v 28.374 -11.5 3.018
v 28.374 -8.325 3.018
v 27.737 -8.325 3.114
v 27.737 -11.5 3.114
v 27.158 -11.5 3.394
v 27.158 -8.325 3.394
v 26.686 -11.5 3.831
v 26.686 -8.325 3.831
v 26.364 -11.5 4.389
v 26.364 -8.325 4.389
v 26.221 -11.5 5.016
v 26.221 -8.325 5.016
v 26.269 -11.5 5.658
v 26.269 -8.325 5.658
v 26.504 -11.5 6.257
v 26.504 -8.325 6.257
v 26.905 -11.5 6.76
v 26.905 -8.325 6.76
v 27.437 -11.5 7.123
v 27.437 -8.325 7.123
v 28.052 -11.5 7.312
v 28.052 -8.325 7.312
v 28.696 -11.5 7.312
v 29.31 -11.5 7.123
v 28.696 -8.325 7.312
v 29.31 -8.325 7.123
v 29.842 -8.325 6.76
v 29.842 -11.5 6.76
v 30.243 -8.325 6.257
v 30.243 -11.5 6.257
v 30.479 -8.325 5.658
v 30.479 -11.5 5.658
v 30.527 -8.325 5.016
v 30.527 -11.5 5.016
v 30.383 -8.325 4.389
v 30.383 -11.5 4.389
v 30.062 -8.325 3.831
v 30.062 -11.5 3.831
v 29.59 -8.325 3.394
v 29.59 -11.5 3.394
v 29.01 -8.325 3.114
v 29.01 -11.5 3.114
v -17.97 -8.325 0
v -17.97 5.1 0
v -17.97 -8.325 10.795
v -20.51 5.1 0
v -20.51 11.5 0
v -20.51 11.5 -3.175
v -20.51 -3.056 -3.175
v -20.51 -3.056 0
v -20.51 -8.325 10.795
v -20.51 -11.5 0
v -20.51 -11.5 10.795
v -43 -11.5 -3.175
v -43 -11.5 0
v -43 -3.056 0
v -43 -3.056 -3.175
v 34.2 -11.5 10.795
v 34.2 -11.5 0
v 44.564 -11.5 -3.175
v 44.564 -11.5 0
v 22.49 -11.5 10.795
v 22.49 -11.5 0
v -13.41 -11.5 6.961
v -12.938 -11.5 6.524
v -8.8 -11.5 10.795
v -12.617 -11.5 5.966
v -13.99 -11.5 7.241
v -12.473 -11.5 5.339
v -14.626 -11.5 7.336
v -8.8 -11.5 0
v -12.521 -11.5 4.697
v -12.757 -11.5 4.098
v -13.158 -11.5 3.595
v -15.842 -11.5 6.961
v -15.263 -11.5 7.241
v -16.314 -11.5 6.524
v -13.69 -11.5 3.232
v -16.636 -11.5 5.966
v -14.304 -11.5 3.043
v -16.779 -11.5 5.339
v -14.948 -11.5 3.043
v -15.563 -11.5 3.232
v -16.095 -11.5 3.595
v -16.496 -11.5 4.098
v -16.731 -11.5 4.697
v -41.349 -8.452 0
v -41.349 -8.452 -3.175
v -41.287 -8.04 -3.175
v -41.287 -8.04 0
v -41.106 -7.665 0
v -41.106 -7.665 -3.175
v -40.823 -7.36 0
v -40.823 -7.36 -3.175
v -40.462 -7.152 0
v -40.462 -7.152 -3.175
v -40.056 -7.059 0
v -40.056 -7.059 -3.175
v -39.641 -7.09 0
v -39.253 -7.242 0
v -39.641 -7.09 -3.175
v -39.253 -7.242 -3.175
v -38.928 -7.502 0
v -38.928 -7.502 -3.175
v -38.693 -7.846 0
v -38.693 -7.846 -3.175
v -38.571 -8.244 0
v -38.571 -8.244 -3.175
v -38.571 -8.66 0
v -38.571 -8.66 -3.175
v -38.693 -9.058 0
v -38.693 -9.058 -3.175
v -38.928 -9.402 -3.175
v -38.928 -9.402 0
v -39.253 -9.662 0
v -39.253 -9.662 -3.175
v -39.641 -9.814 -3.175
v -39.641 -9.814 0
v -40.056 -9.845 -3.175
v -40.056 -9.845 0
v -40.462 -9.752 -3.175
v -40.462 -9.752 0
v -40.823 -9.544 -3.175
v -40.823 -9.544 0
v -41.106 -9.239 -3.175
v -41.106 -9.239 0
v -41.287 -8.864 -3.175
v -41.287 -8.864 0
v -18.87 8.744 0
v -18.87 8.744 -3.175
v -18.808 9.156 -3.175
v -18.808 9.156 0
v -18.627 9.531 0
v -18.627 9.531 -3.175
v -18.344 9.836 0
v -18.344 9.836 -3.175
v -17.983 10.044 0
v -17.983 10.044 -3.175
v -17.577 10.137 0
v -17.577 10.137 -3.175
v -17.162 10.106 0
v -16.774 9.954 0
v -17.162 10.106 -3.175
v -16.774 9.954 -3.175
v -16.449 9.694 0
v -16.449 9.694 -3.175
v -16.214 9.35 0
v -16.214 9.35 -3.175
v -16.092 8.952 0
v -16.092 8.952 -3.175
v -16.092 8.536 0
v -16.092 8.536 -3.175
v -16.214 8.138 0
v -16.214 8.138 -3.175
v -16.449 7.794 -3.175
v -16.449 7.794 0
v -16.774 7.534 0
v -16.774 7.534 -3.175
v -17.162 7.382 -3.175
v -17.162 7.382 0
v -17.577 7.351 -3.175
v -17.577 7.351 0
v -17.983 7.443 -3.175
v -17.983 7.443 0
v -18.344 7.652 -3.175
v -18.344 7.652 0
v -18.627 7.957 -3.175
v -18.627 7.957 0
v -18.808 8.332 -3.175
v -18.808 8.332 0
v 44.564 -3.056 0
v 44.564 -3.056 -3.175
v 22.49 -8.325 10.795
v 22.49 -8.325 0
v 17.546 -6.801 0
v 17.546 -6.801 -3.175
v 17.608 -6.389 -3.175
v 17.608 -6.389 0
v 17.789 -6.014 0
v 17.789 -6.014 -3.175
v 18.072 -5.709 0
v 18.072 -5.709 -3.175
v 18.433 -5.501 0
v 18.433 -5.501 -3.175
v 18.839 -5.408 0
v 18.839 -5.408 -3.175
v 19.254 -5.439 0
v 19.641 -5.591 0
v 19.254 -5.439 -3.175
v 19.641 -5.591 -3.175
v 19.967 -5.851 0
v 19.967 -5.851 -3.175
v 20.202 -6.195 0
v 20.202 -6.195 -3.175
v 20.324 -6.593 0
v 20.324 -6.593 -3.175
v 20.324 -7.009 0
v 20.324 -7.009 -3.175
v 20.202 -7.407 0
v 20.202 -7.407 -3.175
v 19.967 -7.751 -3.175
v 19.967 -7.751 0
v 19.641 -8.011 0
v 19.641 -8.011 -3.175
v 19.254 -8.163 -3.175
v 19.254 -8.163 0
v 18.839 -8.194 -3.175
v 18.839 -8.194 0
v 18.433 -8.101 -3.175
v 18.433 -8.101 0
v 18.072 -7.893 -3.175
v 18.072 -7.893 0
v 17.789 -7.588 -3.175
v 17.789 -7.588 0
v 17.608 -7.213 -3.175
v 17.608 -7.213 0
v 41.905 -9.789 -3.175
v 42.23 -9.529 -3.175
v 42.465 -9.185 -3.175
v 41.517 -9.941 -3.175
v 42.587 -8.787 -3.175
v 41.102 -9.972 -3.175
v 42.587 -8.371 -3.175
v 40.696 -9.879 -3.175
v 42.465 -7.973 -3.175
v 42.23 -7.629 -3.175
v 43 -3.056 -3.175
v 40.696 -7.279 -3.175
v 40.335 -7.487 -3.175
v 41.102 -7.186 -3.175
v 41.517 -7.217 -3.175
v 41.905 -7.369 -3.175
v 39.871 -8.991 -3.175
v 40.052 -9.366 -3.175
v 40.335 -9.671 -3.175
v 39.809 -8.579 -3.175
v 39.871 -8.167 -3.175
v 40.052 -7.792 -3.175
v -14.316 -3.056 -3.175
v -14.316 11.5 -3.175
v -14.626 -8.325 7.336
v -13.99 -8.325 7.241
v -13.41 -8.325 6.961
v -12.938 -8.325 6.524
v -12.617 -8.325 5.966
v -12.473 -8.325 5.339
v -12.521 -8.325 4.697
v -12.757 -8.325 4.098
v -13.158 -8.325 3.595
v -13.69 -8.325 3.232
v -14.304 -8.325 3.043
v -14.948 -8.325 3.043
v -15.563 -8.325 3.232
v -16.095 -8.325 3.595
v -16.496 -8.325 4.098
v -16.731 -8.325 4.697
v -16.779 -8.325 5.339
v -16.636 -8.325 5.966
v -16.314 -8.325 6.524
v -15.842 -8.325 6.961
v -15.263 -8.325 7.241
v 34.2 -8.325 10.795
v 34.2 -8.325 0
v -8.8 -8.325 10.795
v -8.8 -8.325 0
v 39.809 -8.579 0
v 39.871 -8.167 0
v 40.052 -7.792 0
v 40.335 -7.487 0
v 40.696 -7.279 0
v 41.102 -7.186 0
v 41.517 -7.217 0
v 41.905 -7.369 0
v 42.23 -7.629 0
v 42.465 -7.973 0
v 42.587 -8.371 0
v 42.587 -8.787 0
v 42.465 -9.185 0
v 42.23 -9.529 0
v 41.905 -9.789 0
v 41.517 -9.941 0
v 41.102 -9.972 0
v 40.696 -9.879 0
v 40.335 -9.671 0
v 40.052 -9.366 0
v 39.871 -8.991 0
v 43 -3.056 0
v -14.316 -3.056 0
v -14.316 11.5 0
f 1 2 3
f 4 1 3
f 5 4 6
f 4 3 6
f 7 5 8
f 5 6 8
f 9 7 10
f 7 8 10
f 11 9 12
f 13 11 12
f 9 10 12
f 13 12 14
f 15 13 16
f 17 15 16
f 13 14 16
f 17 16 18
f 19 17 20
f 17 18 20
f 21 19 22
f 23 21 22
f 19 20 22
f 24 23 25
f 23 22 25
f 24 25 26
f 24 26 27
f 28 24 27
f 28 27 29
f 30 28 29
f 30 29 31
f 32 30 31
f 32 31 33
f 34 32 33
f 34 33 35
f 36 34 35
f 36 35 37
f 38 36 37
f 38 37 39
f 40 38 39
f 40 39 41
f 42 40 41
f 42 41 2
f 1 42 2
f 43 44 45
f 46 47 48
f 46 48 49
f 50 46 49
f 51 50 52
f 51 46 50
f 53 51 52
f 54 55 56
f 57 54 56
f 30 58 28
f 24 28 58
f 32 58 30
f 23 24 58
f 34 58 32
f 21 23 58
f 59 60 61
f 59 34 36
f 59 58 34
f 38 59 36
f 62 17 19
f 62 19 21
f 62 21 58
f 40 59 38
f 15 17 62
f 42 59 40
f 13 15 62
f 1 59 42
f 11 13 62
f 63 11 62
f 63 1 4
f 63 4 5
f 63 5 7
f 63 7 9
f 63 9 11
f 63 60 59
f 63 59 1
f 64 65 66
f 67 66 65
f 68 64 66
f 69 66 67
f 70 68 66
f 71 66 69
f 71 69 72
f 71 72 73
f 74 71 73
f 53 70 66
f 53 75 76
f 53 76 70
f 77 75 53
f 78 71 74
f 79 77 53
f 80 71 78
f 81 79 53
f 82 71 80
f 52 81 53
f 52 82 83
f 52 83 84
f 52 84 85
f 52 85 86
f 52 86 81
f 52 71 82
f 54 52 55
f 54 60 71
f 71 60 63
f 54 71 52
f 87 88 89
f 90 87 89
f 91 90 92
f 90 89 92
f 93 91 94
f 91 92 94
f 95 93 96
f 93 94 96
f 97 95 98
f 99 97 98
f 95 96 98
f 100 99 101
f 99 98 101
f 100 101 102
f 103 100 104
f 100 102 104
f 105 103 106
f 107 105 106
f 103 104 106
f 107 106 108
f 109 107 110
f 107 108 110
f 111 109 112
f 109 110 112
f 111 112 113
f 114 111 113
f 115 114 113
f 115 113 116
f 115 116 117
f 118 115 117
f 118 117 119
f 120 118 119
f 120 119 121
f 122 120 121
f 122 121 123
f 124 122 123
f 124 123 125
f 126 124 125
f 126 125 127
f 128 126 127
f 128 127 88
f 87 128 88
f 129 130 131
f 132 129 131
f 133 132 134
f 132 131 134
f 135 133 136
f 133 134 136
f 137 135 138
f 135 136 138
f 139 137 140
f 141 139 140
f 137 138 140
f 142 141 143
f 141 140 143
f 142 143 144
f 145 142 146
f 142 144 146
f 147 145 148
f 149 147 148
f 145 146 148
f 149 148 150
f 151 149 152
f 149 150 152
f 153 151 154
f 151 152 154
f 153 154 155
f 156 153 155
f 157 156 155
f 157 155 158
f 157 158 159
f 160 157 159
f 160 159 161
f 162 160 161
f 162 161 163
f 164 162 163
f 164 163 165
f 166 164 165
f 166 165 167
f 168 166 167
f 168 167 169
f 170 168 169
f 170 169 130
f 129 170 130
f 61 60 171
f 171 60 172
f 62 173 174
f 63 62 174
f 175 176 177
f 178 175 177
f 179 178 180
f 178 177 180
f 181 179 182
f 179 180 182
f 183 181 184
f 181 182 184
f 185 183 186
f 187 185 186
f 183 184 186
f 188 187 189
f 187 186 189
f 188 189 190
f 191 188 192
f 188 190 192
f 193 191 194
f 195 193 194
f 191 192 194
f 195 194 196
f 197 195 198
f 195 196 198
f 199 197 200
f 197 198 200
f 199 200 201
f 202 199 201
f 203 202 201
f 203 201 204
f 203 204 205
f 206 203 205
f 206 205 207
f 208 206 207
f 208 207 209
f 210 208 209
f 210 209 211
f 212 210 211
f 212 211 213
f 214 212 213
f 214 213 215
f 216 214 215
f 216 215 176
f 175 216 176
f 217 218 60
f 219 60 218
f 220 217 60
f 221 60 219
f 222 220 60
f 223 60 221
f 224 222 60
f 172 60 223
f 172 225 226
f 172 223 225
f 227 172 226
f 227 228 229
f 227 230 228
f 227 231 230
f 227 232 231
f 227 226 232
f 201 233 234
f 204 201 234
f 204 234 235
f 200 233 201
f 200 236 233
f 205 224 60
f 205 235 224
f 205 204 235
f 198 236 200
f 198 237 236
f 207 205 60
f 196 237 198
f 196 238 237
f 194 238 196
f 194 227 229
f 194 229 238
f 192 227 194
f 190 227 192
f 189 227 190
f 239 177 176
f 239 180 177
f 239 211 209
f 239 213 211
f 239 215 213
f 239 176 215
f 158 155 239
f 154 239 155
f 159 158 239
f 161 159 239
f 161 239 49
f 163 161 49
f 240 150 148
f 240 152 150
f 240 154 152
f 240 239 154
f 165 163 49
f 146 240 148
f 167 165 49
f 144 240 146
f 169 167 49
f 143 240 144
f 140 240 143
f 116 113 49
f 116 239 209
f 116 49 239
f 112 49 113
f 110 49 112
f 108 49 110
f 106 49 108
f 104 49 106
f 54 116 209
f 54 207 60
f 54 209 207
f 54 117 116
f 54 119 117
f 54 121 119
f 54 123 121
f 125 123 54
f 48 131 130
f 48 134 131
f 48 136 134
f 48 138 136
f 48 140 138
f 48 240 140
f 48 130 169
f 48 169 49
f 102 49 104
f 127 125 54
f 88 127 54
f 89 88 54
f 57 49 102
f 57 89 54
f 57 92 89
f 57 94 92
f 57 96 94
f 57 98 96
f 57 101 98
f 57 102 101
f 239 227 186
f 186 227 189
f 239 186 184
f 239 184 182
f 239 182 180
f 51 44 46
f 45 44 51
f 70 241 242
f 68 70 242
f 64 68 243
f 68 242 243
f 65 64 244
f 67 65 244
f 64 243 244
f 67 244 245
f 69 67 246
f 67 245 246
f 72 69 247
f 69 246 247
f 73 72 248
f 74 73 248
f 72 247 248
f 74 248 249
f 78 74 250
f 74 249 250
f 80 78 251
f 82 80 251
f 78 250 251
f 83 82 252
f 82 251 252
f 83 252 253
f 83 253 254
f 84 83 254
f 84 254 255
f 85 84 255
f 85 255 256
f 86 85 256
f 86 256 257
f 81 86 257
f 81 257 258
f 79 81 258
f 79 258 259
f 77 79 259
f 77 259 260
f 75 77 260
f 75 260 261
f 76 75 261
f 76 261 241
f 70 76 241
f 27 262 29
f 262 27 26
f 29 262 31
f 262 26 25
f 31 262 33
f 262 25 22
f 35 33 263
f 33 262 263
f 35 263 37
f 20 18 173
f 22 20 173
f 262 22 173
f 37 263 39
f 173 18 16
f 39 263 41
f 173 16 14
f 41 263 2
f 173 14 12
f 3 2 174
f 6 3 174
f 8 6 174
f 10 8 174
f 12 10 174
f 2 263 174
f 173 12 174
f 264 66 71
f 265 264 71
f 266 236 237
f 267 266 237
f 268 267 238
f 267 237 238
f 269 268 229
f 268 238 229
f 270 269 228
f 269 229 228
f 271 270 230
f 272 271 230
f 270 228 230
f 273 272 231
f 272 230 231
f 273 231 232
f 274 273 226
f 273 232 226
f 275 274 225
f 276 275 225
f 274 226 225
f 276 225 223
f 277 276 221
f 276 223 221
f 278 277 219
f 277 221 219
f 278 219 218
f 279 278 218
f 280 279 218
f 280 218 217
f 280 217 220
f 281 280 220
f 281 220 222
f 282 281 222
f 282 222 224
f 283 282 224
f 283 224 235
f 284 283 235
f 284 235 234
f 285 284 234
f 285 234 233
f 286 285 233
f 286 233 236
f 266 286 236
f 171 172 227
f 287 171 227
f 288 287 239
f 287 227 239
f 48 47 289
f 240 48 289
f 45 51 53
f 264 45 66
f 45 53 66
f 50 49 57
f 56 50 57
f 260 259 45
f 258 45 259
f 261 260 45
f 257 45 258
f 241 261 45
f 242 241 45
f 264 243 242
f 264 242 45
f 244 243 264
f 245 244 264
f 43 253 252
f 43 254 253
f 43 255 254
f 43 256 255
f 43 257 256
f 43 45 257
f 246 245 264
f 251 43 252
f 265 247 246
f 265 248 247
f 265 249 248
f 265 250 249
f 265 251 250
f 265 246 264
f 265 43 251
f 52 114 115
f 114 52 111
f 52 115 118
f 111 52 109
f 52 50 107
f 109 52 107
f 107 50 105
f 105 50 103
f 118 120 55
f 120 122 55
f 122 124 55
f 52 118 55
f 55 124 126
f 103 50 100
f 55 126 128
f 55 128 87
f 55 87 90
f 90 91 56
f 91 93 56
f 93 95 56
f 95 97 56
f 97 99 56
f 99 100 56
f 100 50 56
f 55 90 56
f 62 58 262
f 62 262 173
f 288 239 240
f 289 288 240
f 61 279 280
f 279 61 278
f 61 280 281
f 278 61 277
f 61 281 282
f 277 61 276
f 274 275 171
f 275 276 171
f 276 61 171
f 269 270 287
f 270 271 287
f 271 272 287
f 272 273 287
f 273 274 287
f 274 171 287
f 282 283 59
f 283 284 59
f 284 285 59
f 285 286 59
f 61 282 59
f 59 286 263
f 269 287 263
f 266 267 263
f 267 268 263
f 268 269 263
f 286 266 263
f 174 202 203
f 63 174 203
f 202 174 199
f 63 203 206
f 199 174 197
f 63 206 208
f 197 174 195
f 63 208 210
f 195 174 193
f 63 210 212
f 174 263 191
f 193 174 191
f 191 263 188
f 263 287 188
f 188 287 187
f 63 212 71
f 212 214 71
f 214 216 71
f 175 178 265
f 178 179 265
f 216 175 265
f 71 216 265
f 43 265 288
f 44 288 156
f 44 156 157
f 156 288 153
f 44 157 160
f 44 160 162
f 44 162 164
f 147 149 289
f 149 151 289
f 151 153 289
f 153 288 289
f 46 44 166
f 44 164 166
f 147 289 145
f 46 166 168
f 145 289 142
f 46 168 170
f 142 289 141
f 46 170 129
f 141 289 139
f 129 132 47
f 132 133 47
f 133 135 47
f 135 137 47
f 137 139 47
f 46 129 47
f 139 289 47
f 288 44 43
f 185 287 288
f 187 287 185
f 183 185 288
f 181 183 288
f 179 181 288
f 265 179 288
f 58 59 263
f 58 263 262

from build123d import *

# Parameters (mm, degrees)
SKETCH1_W           = 86
SKETCH1_H           = 23
BOSS_EXTRUDE1_DEPTH = 3.175
BOSS_EXTRUDE2_DEPTH = 3.175
SKETCH18_R          = 2.159
CUT_EXTRUDE2_DEPTH  = 127
SKETCH19_R          = 1.397
CUT_EXTRUDE3_DEPTH  = 47.652019249
SKETCH28_W          = 1.563549178
SKETCH28_H          = 8.443792612
BOSS_EXTRUDE4_DEPTH = 3.175
SKETCH27_W          = 57.315527743
SKETCH27_H          = 14.55620742
SKETCH27_W_2        = 22.489872753
CUT_EXTRUDE5_DEPTH  = 3.175
SKETCH29_W          = 13.689872798
SKETCH29_H          = 10.795
SKETCH29_W_2        = 13.689872764
CUT_EXTRUDE6_DEPTH  = 50.8
RIB3_REACH          = 68.958
SKETCH30_WALL_W     = 153.142504754
SKETCH30_WALL_H     = 2.54


with BuildPart() as part:
    # Sketch1 → Boss-Extrude1 (new body)
    with BuildSketch(Plane.XY):
        Rectangle(SKETCH1_W, SKETCH1_H)
    extrude(amount=-BOSS_EXTRUDE1_DEPTH)

    # Sketch3 → Boss-Extrude2 (add)
    with BuildSketch(Plane(origin=(0, -11.5, 0), x_dir=(-1, 0, 0), z_dir=(0, -1, 0))):
        Polygon((34.200000011, 0), (34.200000011, -10.795), (8.80000001, -10.795), (8.800000011, 0), align=None)
        Polygon((-34.200000011, 0), (-34.200000011, -10.795), (-8.80000001, -10.795), (-8.800000011, 0), align=None)
    extrude(amount=-BOSS_EXTRUDE2_DEPTH)

    # Sketch18 → Cut-Extrude2 (cut)
    with BuildSketch(Plane(origin=(0, 11.5, 0), x_dir=(1, 0, 0), z_dir=(0, 1, 0))):
        with Locations(Location((-14.626260209, -5.177433052, 0), (0, 0, 270))):
            Circle(SKETCH18_R)
        with Locations(Location((28.373739812, -5.177433052, 0), (0, 0, 90))):
            Circle(SKETCH18_R)
    extrude(amount=-CUT_EXTRUDE2_DEPTH, mode=Mode.SUBTRACT)

    # Sketch19 → Cut-Extrude3 (cut, through all)
    with BuildSketch(Plane(origin=(0, 0, -3.175), x_dir=(-1, 0, 0), z_dir=(0, 0, -1))):
        with Locations((-41.206, -8.579)):
            Circle(SKETCH19_R)
        with Locations((-18.9429, -6.801)):
            Circle(SKETCH19_R)
        with Locations((17.473, 8.7438)):
            Circle(SKETCH19_R)
        with Locations((39.952, -8.452)):
            Circle(SKETCH19_R)
    extrude(amount=-CUT_EXTRUDE3_DEPTH, mode=Mode.SUBTRACT)

    # Sketch28 → Boss-Extrude4 (add)
    with BuildSketch(Plane(origin=(0, 0, -3.175), x_dir=(-1, 0, 0), z_dir=(0, 0, -1))):
        with Locations((-43.781774589, -7.278103694)):
            Rectangle(SKETCH28_W, SKETCH28_H)
    extrude(amount=-BOSS_EXTRUDE4_DEPTH)

    # Sketch27 → Cut-Extrude5 (cut)
    with BuildSketch(Plane(origin=(0, 0, -3.175), x_dir=(-1, 0, 0), z_dir=(0, 0, -1))):
        with Locations((-14.342236128, 4.22189629)):
            Rectangle(SKETCH27_W, SKETCH27_H)
        with Locations((31.755063623, 4.22189629)):
            Rectangle(SKETCH27_W_2, SKETCH27_H)
    extrude(amount=-CUT_EXTRUDE5_DEPTH, mode=Mode.SUBTRACT)

    # Sketch29 → Cut-Extrude6 (cut)
    with BuildSketch(Plane(origin=(0, 11.5, 0), x_dir=(1, 0, 0), z_dir=(0, 1, 0))):
        with Locations((15.644936409, -5.3975)):
            Rectangle(SKETCH29_W, SKETCH29_H)
        with Locations((-27.355063629, -5.3975)):
            Rectangle(SKETCH29_W_2, SKETCH29_H)
    extrude(amount=-CUT_EXTRUDE6_DEPTH, mode=Mode.SUBTRACT)

    # Sketch30 wall → Rib3 (add, up to next)
    with BuildSketch(Plane(origin=(-20.510127247, -1.612609393, 5.3975), x_dir=(0, -0.779303981028, 0.626646076468), z_dir=(0, 0.626646076468, 0.779303981028)), mode=Mode.PRIVATE) as rib3_sk1:
        with Locations((0, 1.27)):
            Rectangle(SKETCH30_WALL_W, SKETCH30_WALL_H)
    rib3_tool1 = extrude(rib3_sk1.sketch, amount=-RIB3_REACH, mode=Mode.PRIVATE) - part.part
    add(rib3_tool1.solids().sort_by_distance((-20.510127247, -1.612609393, 5.3975))[0])


solid = part.part
